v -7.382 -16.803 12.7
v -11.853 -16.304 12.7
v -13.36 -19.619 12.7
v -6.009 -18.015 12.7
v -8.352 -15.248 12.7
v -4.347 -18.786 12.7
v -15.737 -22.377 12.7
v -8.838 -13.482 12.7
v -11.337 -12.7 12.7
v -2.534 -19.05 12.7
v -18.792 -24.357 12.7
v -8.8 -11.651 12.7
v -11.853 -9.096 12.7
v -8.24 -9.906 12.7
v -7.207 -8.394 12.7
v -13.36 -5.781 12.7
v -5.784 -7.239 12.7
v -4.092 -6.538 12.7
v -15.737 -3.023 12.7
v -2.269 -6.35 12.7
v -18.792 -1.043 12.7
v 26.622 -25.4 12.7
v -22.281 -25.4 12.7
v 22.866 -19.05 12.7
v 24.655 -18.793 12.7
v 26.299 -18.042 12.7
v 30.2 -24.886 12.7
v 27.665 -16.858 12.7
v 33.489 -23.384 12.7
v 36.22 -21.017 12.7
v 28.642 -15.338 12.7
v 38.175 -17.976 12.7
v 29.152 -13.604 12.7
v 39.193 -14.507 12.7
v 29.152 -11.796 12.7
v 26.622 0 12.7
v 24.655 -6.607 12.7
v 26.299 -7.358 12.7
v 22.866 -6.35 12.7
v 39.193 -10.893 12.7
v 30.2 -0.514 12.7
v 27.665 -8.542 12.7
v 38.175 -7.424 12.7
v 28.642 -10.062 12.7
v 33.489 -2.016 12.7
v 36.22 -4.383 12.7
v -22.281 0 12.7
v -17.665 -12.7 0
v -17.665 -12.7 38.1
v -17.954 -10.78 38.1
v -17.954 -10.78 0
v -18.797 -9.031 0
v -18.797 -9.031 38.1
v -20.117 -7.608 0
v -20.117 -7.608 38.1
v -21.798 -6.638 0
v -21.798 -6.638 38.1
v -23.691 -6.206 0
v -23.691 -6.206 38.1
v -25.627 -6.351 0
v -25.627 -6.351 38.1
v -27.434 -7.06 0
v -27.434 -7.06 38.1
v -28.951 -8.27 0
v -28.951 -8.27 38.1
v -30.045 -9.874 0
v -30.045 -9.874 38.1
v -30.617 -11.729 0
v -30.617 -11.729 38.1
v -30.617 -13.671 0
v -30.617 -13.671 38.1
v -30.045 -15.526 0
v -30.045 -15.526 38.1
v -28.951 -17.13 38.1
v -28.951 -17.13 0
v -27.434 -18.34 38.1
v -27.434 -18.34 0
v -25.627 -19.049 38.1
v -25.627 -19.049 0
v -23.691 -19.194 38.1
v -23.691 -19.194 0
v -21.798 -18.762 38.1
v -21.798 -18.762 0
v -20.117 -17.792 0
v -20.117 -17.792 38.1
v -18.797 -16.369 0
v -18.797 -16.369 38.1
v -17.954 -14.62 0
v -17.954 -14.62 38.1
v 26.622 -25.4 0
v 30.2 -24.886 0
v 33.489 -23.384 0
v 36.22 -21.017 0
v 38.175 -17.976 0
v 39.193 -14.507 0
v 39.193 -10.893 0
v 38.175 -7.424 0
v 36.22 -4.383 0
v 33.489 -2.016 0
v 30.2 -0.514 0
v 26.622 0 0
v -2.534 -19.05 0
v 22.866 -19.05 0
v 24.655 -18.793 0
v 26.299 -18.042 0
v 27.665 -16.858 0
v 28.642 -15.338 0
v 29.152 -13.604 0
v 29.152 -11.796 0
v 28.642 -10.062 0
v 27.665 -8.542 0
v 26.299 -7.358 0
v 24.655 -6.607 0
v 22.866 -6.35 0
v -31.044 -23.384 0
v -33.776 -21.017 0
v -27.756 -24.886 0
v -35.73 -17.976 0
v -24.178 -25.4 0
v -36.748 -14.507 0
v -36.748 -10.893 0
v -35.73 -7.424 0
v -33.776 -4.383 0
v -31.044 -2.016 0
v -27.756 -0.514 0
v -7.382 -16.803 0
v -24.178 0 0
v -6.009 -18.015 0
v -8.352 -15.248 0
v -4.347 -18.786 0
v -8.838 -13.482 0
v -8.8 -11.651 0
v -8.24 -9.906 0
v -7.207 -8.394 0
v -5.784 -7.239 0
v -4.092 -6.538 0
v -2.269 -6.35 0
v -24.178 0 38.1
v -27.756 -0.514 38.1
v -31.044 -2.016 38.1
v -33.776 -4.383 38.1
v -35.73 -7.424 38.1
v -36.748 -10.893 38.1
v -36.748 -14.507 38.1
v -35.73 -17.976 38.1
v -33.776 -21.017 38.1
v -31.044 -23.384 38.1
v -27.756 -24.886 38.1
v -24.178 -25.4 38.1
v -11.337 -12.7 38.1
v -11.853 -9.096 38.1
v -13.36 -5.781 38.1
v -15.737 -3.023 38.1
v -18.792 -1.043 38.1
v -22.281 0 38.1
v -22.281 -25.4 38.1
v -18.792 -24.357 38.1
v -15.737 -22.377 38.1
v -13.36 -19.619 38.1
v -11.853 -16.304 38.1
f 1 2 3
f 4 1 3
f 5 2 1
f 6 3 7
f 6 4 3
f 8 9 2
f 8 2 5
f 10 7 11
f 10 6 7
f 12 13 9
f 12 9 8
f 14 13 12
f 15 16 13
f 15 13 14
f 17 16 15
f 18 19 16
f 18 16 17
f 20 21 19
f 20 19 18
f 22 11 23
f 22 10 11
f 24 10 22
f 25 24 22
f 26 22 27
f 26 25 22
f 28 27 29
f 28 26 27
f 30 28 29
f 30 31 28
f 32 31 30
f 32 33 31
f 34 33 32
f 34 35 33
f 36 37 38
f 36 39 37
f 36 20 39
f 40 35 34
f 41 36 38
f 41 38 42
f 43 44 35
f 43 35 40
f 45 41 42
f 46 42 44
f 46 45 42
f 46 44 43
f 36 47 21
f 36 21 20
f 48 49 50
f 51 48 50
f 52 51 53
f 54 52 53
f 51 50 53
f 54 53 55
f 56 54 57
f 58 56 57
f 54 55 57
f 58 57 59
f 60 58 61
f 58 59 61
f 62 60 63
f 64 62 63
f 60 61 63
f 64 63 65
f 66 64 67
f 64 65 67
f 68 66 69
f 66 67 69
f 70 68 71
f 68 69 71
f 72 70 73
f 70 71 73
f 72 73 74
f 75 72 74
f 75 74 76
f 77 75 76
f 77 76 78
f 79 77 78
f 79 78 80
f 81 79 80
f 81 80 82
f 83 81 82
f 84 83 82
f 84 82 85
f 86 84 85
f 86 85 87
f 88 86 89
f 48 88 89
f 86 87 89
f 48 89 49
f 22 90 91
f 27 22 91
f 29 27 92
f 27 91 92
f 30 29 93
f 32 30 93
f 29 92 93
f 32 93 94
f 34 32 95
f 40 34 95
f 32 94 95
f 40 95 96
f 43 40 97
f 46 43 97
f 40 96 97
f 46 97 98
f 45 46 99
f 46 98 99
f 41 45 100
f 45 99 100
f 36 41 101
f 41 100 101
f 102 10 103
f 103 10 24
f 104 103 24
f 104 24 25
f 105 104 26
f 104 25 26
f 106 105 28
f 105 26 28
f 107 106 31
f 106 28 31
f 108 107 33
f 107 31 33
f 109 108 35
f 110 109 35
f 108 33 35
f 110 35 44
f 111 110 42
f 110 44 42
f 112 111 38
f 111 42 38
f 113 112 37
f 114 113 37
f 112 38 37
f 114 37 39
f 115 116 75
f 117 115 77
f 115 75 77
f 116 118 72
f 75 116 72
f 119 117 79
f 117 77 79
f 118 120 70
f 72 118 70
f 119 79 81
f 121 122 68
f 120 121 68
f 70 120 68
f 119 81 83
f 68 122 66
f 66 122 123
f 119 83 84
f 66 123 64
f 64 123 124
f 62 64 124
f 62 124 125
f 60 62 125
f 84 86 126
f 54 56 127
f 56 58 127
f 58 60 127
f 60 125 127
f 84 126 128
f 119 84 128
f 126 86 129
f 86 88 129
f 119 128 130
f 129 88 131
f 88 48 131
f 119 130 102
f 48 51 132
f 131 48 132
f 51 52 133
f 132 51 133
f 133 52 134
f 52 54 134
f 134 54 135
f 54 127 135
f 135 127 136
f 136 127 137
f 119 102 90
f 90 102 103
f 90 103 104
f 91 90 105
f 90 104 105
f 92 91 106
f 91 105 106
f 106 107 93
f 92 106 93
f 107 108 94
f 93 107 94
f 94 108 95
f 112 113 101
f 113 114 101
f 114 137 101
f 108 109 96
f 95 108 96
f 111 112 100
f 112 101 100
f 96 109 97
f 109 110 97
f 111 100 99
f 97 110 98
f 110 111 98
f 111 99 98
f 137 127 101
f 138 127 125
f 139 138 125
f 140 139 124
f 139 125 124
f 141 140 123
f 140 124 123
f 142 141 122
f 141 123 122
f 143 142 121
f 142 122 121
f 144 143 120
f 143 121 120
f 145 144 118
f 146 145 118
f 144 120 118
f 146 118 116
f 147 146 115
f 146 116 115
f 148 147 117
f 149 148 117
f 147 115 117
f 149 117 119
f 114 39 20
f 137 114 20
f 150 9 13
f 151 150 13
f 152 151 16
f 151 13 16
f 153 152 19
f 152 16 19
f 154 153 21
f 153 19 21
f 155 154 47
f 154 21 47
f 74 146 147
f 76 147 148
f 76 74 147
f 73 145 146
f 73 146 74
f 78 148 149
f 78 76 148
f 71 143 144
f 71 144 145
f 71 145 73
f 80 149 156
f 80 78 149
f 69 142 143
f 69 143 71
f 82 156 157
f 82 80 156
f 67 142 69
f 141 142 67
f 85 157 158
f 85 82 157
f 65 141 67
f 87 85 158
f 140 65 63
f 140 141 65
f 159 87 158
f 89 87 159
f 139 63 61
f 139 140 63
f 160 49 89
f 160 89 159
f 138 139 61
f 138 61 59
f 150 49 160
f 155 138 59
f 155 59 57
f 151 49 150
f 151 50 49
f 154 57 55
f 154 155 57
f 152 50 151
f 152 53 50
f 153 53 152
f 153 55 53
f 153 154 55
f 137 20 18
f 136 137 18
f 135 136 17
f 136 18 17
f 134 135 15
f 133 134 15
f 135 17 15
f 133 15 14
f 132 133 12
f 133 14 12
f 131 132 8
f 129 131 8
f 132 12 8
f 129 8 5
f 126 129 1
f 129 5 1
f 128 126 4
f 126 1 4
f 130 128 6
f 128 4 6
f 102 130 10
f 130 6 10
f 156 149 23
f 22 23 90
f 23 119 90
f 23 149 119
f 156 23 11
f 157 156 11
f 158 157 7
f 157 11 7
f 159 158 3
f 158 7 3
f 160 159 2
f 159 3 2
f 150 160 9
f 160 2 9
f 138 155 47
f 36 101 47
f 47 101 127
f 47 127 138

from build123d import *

# Parameters (mm, degrees)
F0_W     = 50.8
F0_H     = 25.4
F1_DEPTH = 12.7
F3_DEPTH = 25.4
F4_R     = 6.512394
F5_DEPTH = 38.1
F7_DEPTH = 12.7


with BuildPart() as f1:
    # F0 (on Top) → F1 (new body)
    with BuildSketch(Plane.XY):
        with Locations((1.222458, -12.7)):
            Rectangle(F0_W, F0_H)
        with BuildLine():
            Line((-24.177542, -25.4), (-24.177542, 0))
            ThreePointArc((-24.177542, 0), (-36.877542, -12.7), (-24.177542, -25.4))
        make_face()
        with BuildLine():
            ThreePointArc((26.622458, -25.4), (39.322458, -12.7), (26.622458, 0))
            Line((26.622458, 0), (26.622458, -25.4))
        make_face()
    extrude(amount=F1_DEPTH)

    # F2 (on face) → F3 (join)
    with BuildSketch(Plane.XY.offset(12.7)):
        with BuildLine():
            ThreePointArc((-22.280858, -25.4), (-14.450198, -21.082493), (-11.336692, -12.7))
            ThreePointArc((-11.336692, -12.7), (-14.450198, -4.317507), (-22.280858, 0))
            Line((-22.280858, 0), (-24.177542, 0))
            ThreePointArc((-24.177542, 0), (-36.877542, -12.7), (-24.177542, -25.4))
            Line((-24.177542, -25.4), (-22.280858, -25.4))
        make_face()
    extrude(amount=F3_DEPTH)

    # F4 (on face) → F5 (cut)
    with BuildSketch(Plane.XY.offset(38.1)):
        with Locations((-24.177542, -12.7)):
            Circle(F4_R)
    extrude(amount=-F5_DEPTH, mode=Mode.SUBTRACT)

    # F6 (on face) → F7 (cut)
    with BuildSketch(Plane.XY.offset(12.7)):
        with BuildLine():
            ThreePointArc((22.866193, -19.05), (29.216193, -12.7), (22.866193, -6.35))
            Line((22.866193, -6.35), (22.866193, -19.05))
        make_face()
        Polygon((22.866193, -6.35), (-2.269224, -6.35), (-2.533807, -19.05), (22.866193, -19.05), align=None)
        with BuildLine():
            Line((-2.533807, -19.05), (-2.269224, -6.35))
            ThreePointArc((-2.269224, -6.35), (-8.885185, -12.564924), (-2.533807, -19.05))
        make_face()
    extrude(amount=-F7_DEPTH, mode=Mode.SUBTRACT)


solid = f1.part
